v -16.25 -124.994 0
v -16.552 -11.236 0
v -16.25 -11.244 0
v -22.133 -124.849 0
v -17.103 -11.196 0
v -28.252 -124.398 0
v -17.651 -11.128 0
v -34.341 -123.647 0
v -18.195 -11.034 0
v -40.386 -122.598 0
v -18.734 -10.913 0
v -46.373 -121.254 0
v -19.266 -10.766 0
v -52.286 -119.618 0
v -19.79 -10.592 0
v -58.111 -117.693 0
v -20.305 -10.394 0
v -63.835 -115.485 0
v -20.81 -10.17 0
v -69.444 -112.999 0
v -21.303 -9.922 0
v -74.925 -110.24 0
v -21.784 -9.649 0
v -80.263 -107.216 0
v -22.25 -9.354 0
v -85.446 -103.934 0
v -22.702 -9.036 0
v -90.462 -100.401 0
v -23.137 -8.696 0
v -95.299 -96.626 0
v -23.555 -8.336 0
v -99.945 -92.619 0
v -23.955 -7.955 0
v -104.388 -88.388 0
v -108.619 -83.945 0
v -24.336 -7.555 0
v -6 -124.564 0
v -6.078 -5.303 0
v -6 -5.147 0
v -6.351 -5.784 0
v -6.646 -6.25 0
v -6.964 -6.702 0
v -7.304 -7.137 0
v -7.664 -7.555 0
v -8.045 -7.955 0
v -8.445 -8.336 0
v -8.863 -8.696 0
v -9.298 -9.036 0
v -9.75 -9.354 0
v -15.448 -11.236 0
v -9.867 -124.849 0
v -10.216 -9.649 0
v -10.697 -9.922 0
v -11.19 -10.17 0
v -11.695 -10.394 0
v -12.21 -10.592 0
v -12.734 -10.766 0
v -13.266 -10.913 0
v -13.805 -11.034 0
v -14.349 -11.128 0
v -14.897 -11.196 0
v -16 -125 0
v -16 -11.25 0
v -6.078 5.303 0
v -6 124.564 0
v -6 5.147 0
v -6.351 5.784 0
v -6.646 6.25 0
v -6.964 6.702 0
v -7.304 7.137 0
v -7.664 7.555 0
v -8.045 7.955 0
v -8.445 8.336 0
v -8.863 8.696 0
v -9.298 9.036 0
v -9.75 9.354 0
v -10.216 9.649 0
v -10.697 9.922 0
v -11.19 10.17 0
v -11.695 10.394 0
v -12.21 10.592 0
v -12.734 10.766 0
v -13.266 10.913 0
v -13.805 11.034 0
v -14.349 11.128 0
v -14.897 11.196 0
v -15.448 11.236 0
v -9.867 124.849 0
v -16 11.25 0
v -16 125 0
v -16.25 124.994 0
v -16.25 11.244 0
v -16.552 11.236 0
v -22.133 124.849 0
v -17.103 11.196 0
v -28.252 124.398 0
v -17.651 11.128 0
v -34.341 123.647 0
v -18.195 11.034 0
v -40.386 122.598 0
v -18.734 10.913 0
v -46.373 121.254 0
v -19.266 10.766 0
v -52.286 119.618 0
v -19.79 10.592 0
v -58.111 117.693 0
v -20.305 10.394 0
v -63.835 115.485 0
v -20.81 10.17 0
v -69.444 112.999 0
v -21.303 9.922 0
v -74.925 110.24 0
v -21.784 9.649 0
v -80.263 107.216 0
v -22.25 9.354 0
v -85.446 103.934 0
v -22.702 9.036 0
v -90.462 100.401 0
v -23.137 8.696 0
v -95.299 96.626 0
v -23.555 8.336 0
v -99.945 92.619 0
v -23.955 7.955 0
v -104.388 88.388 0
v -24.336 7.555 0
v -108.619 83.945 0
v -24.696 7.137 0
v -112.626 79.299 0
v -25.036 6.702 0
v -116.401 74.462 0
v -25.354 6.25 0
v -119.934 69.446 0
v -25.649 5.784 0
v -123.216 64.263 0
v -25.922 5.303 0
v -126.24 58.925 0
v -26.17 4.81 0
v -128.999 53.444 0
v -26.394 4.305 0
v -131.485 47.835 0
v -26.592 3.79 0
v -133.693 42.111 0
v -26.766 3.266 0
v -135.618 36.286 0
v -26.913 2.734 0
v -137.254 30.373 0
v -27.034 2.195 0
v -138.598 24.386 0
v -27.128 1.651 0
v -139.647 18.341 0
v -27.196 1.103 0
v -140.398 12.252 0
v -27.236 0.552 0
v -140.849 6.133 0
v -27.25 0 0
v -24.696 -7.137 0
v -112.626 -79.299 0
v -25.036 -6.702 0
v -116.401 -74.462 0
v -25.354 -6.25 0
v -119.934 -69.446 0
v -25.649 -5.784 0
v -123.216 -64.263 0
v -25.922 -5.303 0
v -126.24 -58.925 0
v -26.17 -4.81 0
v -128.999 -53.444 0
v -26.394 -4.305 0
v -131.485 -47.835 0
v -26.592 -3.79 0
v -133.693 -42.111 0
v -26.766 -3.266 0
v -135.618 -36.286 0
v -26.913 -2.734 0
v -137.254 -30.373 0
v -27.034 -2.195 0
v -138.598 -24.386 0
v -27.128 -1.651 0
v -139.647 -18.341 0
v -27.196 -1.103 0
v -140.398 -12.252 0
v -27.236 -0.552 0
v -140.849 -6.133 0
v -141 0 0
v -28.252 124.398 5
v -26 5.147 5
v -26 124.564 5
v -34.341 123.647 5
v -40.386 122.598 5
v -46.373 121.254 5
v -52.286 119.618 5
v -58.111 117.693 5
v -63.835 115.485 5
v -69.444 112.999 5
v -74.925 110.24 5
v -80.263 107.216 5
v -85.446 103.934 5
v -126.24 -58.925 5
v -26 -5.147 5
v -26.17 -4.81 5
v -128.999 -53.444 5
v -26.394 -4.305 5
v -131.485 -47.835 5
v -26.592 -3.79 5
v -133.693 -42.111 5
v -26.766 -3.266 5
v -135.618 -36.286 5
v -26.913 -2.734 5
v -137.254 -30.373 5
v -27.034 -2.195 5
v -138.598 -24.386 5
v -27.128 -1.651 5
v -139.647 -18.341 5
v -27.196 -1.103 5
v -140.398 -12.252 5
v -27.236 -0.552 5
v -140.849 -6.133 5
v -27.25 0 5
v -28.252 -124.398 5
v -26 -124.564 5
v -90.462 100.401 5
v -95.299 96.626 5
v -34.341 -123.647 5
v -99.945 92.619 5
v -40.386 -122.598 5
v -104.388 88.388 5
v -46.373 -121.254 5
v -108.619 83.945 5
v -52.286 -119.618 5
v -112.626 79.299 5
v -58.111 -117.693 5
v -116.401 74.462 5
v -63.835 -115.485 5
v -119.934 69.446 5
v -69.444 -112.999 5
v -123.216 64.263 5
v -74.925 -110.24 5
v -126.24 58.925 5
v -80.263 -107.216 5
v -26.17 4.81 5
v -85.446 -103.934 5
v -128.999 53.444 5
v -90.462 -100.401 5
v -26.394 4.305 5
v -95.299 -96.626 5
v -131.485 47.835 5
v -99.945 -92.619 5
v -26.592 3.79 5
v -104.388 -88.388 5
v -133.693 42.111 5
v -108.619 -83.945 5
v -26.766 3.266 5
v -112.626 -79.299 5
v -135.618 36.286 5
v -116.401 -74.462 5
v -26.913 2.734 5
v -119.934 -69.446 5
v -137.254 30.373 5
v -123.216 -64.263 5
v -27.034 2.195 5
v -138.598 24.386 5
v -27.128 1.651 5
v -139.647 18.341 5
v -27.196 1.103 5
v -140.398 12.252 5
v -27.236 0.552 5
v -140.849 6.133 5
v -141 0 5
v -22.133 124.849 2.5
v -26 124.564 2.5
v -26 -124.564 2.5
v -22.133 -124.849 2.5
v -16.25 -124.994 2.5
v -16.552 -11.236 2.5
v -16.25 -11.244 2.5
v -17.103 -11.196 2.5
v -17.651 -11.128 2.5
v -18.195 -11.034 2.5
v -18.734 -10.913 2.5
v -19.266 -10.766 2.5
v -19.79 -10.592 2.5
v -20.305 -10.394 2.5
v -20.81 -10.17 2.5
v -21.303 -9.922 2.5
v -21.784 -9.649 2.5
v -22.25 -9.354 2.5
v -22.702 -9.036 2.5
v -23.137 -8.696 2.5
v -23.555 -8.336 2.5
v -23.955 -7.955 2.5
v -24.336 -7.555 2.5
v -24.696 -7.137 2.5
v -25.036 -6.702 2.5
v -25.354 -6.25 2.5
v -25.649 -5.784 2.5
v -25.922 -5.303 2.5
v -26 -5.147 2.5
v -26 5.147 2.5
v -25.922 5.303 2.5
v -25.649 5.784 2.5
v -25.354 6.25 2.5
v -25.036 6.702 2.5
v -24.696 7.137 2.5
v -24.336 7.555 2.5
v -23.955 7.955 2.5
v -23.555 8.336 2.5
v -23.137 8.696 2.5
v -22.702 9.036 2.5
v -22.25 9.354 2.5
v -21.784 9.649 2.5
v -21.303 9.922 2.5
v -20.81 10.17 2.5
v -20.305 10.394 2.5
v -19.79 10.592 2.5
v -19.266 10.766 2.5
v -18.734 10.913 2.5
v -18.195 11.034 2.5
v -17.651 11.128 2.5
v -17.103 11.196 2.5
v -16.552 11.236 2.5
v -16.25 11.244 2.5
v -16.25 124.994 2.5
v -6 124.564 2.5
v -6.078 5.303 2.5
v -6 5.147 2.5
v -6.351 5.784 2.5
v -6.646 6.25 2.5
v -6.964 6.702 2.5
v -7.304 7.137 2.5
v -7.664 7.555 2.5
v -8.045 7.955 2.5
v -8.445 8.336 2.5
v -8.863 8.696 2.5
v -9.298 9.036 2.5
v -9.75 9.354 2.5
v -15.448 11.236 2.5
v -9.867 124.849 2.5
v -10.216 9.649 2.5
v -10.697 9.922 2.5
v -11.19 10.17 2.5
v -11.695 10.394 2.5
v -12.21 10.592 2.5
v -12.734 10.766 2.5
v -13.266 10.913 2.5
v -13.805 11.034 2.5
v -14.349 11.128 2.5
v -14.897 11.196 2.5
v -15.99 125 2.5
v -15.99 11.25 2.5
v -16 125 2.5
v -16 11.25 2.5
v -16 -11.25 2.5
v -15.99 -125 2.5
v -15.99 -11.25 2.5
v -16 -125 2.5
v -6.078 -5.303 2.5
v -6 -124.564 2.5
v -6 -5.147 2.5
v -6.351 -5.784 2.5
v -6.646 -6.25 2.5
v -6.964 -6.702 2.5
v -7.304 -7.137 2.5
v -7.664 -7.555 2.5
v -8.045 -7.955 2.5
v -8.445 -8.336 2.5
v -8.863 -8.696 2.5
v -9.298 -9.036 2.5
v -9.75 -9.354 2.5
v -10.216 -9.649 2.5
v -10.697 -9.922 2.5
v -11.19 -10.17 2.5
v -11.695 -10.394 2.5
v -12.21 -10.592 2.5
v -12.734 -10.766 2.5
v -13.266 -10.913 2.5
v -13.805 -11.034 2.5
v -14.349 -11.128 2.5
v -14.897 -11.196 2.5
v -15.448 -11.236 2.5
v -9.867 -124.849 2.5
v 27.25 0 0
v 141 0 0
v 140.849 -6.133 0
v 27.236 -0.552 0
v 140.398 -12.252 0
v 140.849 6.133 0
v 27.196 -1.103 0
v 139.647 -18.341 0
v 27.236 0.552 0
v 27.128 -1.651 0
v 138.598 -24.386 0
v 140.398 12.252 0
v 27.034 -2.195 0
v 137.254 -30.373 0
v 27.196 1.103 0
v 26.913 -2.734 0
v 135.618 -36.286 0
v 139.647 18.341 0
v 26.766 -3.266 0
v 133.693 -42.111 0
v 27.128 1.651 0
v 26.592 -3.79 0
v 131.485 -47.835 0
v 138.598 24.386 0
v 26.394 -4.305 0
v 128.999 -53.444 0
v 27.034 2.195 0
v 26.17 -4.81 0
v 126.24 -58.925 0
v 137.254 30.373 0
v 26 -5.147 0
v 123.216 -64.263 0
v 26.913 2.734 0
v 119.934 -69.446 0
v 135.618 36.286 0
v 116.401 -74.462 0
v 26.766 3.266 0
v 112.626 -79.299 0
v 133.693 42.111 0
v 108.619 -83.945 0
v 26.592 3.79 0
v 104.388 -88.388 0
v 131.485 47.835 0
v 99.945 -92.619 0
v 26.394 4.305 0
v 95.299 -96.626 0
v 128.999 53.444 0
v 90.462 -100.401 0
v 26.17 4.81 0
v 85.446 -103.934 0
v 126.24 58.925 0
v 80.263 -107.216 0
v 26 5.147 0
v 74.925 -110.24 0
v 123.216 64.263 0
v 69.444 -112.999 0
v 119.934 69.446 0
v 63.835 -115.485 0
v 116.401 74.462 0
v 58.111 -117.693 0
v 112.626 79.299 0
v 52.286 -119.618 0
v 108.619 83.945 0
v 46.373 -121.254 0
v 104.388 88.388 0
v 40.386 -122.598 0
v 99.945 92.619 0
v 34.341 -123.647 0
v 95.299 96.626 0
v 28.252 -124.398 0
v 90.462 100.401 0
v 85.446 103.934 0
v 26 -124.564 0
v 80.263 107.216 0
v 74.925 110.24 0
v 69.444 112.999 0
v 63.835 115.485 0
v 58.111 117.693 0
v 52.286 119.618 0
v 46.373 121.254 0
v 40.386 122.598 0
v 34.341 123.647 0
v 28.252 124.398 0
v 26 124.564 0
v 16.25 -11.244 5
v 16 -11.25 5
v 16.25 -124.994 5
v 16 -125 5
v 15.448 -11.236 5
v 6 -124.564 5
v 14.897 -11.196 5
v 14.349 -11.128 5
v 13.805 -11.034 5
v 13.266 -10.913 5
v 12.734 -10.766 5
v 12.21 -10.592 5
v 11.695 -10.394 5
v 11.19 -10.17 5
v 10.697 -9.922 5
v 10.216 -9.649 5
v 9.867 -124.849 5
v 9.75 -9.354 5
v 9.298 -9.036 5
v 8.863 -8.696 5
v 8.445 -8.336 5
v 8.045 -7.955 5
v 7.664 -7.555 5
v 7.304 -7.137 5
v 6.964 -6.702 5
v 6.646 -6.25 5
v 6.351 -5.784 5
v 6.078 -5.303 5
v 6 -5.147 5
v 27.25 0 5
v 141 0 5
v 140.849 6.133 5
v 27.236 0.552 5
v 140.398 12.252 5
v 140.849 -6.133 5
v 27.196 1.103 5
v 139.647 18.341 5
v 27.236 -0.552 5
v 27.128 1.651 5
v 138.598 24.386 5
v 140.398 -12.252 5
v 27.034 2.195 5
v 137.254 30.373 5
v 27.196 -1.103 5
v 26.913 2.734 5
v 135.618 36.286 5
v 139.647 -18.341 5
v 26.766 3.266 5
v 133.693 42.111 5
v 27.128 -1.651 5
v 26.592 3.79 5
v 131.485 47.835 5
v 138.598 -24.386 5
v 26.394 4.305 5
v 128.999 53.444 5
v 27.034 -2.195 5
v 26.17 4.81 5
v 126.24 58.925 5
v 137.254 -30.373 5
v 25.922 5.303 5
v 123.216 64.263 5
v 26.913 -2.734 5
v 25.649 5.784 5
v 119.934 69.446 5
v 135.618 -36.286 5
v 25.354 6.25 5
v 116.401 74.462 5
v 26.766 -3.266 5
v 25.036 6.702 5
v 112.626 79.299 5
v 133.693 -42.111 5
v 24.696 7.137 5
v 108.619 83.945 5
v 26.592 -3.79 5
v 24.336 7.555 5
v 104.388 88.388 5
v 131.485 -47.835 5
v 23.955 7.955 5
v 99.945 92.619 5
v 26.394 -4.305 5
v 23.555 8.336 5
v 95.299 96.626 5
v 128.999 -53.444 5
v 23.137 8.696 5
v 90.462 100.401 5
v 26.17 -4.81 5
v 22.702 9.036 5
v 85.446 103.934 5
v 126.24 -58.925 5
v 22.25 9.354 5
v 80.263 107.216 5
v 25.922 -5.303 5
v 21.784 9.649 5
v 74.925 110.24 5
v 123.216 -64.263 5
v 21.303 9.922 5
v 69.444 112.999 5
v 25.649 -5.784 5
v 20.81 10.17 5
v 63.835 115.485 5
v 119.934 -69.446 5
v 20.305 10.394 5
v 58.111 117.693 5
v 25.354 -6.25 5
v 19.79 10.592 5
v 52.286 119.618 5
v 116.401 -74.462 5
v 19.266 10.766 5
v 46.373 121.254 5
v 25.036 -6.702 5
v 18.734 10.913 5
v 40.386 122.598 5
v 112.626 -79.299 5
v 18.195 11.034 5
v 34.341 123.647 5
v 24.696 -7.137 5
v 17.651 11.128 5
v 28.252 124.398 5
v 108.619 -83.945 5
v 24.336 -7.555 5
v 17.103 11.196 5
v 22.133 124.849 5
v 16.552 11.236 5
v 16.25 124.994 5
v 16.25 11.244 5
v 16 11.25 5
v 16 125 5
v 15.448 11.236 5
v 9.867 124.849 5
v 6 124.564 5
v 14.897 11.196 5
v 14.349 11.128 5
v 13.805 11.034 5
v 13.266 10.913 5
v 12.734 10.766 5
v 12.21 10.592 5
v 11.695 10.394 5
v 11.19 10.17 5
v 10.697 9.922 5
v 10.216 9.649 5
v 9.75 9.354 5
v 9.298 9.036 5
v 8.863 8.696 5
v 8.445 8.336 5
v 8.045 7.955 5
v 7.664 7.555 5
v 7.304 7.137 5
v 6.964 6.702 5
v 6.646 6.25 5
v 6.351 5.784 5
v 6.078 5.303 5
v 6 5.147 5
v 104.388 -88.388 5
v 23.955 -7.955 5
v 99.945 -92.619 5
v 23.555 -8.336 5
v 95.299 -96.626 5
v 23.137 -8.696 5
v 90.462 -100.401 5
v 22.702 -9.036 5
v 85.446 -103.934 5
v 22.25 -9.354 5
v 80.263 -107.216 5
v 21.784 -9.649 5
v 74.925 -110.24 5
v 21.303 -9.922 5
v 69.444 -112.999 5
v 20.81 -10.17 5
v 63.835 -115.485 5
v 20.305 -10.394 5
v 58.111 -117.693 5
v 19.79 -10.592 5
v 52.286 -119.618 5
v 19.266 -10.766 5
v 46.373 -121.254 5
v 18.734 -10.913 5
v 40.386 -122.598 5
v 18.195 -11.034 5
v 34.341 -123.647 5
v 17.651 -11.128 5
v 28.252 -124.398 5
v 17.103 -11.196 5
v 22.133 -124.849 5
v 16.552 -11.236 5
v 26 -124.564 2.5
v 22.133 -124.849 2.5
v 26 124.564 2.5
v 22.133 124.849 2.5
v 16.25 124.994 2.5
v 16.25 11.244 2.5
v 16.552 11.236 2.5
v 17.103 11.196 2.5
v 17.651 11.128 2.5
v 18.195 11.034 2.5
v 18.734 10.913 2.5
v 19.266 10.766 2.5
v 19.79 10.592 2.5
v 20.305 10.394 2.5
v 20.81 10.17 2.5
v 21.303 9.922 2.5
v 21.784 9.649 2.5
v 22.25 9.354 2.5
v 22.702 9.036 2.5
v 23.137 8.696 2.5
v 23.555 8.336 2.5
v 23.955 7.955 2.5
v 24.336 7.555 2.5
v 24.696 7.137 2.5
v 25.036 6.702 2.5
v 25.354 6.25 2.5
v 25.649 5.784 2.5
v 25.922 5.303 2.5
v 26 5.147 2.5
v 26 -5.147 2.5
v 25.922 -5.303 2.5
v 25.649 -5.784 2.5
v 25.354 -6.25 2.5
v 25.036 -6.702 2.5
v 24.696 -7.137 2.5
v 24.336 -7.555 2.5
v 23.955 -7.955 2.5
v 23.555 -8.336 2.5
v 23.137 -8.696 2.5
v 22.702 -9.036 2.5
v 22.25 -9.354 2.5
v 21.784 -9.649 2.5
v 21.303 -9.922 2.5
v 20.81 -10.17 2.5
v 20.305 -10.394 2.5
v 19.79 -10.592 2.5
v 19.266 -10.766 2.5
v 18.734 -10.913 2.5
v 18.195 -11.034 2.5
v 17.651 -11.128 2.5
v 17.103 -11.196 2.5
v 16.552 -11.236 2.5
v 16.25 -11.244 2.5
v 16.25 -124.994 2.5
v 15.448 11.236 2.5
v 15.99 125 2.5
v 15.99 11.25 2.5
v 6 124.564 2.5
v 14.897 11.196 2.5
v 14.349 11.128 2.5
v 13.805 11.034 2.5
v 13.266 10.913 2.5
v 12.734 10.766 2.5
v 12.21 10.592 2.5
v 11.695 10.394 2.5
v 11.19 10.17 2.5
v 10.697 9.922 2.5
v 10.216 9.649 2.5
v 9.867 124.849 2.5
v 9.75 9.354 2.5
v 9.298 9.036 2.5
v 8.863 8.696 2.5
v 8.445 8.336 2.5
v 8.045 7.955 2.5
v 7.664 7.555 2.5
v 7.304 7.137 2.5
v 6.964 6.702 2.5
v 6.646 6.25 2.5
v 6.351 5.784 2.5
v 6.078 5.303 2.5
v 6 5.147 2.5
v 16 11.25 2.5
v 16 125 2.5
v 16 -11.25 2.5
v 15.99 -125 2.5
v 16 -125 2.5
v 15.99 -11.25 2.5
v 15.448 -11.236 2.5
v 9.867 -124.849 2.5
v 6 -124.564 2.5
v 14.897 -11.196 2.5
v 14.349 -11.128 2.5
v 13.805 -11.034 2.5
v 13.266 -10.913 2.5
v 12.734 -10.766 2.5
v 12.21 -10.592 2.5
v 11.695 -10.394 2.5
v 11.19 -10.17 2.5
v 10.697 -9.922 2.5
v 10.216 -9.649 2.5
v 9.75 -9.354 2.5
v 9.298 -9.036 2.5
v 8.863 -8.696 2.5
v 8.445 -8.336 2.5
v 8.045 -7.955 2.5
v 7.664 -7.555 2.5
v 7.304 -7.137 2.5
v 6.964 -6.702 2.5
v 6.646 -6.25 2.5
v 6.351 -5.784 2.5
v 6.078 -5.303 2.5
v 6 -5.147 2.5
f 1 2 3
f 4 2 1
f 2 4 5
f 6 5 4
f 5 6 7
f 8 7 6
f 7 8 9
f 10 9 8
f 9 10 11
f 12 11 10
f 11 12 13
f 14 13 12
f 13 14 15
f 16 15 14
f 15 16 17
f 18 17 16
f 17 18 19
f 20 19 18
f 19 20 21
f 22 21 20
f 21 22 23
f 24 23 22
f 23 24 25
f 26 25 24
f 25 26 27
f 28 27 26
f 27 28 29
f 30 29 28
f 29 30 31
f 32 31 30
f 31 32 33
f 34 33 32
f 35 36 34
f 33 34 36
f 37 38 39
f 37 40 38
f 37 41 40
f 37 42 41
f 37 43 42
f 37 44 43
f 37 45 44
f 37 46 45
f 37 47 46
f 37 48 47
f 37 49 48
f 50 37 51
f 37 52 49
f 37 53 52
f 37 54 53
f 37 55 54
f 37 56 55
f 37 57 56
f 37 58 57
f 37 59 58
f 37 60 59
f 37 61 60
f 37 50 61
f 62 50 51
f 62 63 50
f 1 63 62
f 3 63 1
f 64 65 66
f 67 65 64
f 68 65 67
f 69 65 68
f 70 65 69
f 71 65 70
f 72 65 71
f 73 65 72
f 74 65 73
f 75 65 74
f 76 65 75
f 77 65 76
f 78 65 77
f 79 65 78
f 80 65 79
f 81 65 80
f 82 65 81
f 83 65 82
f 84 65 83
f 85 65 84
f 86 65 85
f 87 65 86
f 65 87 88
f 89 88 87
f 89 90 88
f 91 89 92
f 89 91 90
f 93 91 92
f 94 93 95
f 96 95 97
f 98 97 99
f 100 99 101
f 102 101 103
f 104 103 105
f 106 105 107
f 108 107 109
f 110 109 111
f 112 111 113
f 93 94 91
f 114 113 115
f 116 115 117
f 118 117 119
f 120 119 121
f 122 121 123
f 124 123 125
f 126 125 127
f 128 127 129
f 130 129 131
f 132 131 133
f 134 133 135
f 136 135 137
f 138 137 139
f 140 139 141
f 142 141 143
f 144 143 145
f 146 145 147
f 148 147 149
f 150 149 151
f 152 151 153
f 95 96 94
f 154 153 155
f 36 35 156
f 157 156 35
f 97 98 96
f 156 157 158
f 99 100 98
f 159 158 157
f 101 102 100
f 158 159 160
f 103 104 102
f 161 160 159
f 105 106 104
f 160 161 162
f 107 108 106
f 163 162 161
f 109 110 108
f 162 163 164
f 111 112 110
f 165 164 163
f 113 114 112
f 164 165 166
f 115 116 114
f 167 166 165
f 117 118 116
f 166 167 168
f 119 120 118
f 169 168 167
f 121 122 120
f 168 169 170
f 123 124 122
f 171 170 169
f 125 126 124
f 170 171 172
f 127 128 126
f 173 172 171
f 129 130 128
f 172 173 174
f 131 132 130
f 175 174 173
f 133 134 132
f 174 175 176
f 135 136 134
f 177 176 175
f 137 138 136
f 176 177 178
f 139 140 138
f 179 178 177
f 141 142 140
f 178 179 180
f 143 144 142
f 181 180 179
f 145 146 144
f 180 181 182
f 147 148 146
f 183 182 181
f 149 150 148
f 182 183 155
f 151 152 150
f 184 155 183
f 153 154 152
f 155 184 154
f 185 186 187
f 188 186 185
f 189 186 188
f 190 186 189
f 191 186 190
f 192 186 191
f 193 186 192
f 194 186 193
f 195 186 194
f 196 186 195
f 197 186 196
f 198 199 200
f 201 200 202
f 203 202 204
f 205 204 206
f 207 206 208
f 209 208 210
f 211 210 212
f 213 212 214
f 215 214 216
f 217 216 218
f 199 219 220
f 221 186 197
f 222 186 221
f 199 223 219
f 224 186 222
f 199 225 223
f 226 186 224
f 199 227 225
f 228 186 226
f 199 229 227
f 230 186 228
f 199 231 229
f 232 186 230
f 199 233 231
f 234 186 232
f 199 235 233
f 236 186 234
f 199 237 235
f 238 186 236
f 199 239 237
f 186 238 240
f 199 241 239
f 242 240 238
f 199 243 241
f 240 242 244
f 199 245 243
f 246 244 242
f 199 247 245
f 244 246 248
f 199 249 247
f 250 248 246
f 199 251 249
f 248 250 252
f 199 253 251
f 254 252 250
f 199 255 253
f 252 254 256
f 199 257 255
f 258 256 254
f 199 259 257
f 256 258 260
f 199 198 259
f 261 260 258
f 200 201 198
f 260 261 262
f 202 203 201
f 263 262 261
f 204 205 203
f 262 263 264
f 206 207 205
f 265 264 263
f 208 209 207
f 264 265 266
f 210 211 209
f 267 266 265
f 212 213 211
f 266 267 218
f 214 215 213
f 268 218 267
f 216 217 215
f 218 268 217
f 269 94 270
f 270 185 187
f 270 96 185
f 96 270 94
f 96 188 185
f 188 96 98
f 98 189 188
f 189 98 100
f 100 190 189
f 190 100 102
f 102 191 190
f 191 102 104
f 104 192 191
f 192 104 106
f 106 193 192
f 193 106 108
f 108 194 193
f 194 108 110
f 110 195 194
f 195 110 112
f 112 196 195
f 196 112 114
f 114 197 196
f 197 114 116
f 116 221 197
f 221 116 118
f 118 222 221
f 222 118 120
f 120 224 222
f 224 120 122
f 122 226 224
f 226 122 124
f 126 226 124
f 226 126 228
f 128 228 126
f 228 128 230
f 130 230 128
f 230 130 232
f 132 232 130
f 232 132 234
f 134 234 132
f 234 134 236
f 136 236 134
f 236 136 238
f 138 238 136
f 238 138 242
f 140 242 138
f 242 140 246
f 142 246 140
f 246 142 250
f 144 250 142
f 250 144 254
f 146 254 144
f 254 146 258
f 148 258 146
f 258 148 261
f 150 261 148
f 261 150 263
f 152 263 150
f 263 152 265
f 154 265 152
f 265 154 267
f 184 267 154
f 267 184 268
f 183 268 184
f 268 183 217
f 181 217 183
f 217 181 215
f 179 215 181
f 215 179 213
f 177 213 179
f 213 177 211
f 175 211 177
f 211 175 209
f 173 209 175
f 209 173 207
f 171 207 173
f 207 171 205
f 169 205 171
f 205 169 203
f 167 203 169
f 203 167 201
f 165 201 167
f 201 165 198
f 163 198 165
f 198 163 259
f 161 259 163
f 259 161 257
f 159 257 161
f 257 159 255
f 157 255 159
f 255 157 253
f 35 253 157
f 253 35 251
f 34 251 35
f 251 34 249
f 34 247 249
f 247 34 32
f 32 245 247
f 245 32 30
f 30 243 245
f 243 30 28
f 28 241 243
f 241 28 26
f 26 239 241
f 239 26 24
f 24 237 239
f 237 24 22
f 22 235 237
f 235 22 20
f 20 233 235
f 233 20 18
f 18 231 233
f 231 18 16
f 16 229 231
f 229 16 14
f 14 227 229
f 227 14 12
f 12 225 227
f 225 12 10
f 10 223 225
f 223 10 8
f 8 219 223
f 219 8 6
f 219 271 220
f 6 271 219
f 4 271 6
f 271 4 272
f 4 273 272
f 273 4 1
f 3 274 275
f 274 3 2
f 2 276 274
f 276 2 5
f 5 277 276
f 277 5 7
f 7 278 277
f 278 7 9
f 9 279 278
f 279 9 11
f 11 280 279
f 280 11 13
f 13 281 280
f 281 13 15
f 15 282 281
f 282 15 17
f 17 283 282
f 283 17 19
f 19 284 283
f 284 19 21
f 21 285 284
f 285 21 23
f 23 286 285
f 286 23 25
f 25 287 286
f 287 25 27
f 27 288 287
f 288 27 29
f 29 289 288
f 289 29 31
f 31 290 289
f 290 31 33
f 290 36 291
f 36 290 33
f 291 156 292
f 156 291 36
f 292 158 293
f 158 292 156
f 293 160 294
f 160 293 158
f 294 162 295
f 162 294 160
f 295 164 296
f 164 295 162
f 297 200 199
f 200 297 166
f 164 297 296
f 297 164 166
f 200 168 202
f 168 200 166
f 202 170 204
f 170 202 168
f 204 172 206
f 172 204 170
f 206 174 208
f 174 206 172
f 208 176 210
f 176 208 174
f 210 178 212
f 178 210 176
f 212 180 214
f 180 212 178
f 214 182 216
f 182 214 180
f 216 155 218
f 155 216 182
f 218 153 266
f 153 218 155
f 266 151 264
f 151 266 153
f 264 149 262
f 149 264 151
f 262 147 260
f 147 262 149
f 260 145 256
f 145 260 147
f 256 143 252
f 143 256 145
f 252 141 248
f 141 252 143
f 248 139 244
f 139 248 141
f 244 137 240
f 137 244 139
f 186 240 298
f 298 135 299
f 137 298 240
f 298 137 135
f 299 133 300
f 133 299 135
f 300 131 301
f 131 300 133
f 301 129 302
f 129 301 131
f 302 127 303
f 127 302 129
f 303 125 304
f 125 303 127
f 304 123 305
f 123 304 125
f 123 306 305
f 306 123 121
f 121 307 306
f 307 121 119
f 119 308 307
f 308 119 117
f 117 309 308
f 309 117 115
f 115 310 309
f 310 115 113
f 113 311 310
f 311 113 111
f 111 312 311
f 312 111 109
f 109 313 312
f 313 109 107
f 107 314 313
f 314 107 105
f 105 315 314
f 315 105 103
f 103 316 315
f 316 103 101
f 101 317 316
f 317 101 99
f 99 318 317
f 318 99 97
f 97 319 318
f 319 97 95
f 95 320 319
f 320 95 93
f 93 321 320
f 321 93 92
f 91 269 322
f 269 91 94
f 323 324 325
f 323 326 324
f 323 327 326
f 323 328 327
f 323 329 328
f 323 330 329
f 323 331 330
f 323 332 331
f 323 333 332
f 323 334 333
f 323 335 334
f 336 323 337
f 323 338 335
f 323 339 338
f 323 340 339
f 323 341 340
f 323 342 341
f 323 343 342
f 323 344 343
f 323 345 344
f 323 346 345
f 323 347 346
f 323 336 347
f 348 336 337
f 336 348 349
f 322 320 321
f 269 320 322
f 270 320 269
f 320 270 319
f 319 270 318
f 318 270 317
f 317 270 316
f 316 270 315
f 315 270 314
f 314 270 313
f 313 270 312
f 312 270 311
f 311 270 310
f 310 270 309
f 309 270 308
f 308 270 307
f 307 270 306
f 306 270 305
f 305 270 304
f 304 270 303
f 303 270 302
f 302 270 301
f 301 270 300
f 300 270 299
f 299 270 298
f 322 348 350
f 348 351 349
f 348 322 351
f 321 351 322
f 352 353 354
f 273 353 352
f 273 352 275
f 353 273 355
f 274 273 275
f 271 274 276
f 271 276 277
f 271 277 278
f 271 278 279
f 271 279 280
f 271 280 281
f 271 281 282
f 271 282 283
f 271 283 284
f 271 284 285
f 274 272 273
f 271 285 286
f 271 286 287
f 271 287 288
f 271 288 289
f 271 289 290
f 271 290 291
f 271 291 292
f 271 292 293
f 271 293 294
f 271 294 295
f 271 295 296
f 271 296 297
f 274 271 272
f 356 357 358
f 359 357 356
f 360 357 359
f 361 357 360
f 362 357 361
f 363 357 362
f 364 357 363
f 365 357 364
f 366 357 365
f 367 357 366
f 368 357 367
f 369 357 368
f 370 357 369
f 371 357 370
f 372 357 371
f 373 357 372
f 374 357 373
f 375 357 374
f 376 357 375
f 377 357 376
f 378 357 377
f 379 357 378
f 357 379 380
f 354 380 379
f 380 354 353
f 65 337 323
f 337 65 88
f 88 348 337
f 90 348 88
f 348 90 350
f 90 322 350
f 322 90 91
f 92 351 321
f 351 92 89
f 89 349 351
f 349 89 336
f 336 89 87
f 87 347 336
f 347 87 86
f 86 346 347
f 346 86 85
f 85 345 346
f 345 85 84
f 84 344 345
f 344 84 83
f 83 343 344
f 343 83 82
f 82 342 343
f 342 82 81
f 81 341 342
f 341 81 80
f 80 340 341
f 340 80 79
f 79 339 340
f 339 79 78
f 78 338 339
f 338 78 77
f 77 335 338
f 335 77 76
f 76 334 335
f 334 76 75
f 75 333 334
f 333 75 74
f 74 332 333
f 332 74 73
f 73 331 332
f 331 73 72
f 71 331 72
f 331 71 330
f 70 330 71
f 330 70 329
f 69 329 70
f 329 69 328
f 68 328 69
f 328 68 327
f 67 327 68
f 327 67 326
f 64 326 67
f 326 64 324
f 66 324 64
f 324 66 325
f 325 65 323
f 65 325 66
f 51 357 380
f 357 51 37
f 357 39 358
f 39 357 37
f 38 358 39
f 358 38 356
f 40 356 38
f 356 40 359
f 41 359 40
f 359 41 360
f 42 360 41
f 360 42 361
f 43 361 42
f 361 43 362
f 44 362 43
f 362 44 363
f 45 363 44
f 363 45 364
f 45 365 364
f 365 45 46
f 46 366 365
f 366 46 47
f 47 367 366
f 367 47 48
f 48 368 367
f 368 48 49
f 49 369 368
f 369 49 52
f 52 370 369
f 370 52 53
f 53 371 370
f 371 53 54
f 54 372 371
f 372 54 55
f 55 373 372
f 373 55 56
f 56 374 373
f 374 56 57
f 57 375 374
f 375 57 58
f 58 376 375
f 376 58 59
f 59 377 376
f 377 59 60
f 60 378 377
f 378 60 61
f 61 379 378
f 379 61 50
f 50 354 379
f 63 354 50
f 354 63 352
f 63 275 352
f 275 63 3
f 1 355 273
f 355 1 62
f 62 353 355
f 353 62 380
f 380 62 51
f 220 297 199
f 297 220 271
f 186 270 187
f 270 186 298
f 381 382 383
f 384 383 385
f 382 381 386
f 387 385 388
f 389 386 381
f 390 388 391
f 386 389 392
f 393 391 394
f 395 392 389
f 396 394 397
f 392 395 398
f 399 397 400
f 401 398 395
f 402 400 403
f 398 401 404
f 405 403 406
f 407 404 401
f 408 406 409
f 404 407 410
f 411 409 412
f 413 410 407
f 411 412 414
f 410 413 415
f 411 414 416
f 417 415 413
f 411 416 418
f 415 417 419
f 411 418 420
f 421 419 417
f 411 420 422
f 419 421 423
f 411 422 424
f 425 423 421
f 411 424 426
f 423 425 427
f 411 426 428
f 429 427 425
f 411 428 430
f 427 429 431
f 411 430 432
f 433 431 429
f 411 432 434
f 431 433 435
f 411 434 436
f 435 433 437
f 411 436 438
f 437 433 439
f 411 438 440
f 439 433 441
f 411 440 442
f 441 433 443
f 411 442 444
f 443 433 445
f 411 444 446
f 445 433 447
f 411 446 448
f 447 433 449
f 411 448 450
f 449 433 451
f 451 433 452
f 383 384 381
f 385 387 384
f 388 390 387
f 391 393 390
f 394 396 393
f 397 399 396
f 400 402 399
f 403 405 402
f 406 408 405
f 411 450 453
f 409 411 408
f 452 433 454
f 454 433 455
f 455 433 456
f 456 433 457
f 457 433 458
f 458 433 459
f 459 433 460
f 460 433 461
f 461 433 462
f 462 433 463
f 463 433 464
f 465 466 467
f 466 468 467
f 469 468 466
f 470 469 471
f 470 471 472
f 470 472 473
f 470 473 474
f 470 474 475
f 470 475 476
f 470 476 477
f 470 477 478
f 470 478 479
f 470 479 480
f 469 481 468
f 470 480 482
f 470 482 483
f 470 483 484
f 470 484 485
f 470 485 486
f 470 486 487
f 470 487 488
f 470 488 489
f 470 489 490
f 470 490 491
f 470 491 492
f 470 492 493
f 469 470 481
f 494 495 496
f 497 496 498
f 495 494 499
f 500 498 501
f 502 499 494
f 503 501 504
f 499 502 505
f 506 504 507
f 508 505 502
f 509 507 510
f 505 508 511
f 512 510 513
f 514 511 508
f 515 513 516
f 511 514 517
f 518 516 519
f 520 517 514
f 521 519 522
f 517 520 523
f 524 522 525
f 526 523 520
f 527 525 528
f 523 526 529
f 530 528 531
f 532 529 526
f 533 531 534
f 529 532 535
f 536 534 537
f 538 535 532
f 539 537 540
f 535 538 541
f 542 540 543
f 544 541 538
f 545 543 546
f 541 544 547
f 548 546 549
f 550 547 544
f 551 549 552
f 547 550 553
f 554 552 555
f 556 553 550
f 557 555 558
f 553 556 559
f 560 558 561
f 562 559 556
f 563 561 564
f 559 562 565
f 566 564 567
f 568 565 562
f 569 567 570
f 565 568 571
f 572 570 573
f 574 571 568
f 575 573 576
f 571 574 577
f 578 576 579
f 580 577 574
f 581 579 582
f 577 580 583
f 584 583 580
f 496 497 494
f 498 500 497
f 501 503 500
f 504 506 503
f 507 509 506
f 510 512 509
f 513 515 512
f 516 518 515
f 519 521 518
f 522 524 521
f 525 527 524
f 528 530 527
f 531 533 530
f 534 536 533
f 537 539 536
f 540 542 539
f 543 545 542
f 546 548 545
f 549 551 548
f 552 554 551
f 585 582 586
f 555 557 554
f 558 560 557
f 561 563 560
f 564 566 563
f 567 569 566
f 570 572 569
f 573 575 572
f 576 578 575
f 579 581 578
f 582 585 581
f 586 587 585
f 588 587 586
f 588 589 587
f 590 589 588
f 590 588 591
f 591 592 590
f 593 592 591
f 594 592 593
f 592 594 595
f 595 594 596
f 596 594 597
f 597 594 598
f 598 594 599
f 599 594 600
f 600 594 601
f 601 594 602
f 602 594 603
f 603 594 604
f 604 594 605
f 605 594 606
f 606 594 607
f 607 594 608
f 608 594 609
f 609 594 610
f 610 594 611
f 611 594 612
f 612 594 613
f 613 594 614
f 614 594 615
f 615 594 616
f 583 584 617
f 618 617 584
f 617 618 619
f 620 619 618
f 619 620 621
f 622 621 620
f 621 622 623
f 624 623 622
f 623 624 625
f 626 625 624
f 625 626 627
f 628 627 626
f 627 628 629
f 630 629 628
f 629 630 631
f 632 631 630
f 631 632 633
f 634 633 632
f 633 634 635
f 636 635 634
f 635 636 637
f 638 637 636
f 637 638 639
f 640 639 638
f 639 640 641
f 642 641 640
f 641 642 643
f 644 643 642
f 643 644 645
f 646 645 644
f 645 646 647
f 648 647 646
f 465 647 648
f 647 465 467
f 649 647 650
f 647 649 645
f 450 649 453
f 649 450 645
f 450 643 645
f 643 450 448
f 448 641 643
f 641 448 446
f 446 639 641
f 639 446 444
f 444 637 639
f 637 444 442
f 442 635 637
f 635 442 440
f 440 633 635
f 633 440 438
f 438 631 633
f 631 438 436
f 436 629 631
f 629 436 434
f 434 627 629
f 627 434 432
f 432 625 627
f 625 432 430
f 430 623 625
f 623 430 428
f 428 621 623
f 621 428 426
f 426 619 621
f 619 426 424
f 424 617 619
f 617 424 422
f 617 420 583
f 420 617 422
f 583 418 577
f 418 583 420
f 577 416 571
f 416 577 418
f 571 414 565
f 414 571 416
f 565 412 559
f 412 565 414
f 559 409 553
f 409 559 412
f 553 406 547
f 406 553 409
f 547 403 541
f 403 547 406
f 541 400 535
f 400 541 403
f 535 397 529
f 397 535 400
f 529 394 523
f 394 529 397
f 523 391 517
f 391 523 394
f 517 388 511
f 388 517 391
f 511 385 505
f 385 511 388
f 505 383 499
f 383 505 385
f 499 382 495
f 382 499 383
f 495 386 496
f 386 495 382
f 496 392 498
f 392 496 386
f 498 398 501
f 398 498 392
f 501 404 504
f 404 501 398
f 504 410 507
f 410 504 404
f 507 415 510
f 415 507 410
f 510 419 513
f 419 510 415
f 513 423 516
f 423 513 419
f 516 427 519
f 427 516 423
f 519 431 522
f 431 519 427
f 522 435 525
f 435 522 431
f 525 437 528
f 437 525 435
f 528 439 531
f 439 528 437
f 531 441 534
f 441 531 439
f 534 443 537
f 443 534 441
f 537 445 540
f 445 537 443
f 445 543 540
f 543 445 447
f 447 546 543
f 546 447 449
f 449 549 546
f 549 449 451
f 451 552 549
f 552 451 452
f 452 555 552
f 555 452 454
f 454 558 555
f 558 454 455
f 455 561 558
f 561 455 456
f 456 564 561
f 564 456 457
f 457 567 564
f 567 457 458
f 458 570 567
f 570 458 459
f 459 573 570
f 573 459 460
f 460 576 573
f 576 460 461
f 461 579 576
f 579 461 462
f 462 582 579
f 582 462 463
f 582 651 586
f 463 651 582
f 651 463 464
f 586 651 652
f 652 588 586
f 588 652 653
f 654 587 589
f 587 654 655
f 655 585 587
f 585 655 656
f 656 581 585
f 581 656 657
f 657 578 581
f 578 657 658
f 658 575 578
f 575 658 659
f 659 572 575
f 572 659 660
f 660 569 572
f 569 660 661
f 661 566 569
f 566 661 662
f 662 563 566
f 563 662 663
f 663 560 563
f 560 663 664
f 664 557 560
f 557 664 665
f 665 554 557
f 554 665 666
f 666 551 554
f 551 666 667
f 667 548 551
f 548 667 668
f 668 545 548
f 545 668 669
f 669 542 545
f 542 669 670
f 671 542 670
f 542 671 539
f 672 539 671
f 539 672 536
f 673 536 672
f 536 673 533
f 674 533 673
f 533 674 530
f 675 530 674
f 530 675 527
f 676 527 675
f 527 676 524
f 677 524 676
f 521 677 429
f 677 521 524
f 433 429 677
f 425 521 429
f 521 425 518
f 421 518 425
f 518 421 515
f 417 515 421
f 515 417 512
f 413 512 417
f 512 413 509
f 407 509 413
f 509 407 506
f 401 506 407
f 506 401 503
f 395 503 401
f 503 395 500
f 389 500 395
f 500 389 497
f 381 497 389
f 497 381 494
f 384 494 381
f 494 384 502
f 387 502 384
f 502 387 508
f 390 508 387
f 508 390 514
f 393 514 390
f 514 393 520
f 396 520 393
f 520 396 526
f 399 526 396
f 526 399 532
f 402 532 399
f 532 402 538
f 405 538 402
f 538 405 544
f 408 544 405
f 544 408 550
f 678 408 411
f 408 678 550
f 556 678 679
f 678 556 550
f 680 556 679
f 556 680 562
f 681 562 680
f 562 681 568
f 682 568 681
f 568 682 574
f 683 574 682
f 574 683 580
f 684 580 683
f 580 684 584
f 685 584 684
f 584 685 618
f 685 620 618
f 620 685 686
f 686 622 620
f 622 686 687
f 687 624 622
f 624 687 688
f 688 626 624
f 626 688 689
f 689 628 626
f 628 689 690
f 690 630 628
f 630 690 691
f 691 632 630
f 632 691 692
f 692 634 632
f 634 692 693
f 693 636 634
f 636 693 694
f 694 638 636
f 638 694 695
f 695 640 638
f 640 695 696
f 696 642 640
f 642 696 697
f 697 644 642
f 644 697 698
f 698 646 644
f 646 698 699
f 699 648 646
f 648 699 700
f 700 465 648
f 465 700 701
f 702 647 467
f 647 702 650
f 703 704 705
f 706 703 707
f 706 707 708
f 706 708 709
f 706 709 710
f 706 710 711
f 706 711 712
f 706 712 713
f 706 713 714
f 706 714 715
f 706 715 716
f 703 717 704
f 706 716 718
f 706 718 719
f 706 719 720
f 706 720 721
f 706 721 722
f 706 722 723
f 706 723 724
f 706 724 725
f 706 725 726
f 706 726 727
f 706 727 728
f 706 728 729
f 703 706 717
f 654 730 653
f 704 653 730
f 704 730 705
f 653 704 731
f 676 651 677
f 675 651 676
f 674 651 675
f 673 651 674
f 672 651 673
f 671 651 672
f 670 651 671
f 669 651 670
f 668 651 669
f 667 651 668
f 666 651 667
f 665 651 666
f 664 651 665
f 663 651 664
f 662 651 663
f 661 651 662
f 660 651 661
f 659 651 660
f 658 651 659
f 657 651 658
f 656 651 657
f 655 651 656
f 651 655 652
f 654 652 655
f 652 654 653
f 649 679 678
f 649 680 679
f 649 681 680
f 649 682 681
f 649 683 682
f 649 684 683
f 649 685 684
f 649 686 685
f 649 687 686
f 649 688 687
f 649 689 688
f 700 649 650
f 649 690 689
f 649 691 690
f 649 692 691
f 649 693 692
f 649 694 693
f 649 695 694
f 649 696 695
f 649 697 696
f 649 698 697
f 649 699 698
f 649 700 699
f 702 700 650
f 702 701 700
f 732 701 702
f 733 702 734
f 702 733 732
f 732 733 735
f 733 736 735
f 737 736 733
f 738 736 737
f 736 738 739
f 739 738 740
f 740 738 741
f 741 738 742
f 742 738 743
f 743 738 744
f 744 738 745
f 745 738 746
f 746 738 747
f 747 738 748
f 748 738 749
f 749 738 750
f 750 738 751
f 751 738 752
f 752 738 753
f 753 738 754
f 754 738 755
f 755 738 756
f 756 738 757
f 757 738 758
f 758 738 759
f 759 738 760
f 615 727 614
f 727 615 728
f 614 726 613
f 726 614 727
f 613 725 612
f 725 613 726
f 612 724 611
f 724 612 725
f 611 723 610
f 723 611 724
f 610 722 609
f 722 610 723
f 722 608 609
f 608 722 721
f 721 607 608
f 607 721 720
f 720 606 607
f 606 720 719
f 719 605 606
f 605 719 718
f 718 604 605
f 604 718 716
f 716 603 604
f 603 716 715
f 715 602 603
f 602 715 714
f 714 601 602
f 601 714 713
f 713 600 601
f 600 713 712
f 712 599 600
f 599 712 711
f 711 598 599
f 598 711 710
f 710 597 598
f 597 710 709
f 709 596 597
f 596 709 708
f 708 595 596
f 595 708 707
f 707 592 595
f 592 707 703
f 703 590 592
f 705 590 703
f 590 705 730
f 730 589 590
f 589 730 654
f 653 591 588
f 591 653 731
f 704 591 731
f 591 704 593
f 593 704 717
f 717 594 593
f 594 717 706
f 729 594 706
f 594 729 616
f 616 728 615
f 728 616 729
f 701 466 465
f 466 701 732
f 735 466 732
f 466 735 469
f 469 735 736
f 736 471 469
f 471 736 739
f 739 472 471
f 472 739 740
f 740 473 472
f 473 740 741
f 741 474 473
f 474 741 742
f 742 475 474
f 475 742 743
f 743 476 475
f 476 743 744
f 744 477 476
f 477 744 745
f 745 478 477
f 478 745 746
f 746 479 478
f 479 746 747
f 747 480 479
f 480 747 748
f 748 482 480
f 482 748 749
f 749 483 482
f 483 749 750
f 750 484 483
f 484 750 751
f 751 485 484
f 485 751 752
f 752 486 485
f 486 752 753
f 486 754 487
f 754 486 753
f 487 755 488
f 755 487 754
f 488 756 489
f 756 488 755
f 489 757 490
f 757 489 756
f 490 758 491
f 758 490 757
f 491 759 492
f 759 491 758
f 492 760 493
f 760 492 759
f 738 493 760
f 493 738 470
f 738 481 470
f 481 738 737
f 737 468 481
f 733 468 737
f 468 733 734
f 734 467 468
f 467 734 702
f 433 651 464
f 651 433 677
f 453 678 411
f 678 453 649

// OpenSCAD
// file: ProjectGrace-RigidEndStop-Parts.scad
$fn = 128;

disc_diameter = 250;
disc_thickness = 5;
pipe_slot_width = 22.5;
lap_overlap_width = 10;
lap_seam_overlap = 0.25;
assembly_gap = 12;
assembly_offset = lap_overlap_width + assembly_gap / 2;

module pipe_entry_bore_2d() {
    circle(d = pipe_slot_width);
}

module pipe_entry_slot_2d(is_left) {
    slot_radius = pipe_slot_width / 2;

    intersection() {
        pipe_entry_bore_2d();

        if (is_left)
            translate([-slot_radius, -slot_radius])
                square([slot_radius, pipe_slot_width]);
        else
            translate([0, -slot_radius])
                square([slot_radius, pipe_slot_width]);
    }
}

module disc_half_outline_2d(is_left) {
    difference() {
        intersection() {
            circle(d = disc_diameter);

            if (is_left)
                translate([-disc_diameter / 2, -disc_diameter / 2])
                    square([disc_diameter / 2, disc_diameter]);
            else
                translate([0, -disc_diameter / 2])
                    square([disc_diameter / 2, disc_diameter]);
        }

        // Each half contributes one semicircular notch, forming a round hole when joined.
        pipe_entry_slot_2d(is_left);
    }
}

module lap_shelf_2d(extends_right) {
    difference() {
        intersection() {
            circle(d = disc_diameter);

            if (extends_right)
                translate([-lap_seam_overlap, -disc_diameter / 2 - 1])
                    square([lap_overlap_width + lap_seam_overlap, disc_diameter + 2]);
            else
                translate([-lap_overlap_width, -disc_diameter / 2 - 1])
                    square([lap_overlap_width + lap_seam_overlap, disc_diameter + 2]);
        }

        // Keep the complete pipe bore clear through the overlapping lap shelf.
        pipe_entry_bore_2d();
    }
}

module rigid_end_stop_part_a() {
    half_height = disc_thickness / 2;

    difference() {
        union() {
            linear_extrude(height = disc_thickness)
                disc_half_outline_2d(true);
            linear_extrude(height = half_height)
                lap_shelf_2d(true);
        }

        translate([-lap_overlap_width, -disc_diameter / 2 - 1, half_height])
            cube([lap_overlap_width + 0.01, disc_diameter + 2, half_height + 0.01]);
    }
}

module rigid_end_stop_part_b() {
    half_height = disc_thickness / 2;

    difference() {
        union() {
            linear_extrude(height = disc_thickness)
                disc_half_outline_2d(false);
            translate([0, 0, half_height])
                linear_extrude(height = half_height)
                    lap_shelf_2d(false);
        }

        translate([-0.01, -disc_diameter / 2 - 1, 0])
            cube([lap_overlap_width + 0.01, disc_diameter + 2, half_height]);
    }
}
// main file
// Exploded preview of the split rigid end stop and its half-height glue ledges.

include <ProjectGrace-RigidEndStop-Parts.scad>

color("red")
    translate([-assembly_offset, 0, 0])
        rigid_end_stop_part_a();

color("red")
    translate([assembly_offset, 0, 0])
        rigid_end_stop_part_b();
